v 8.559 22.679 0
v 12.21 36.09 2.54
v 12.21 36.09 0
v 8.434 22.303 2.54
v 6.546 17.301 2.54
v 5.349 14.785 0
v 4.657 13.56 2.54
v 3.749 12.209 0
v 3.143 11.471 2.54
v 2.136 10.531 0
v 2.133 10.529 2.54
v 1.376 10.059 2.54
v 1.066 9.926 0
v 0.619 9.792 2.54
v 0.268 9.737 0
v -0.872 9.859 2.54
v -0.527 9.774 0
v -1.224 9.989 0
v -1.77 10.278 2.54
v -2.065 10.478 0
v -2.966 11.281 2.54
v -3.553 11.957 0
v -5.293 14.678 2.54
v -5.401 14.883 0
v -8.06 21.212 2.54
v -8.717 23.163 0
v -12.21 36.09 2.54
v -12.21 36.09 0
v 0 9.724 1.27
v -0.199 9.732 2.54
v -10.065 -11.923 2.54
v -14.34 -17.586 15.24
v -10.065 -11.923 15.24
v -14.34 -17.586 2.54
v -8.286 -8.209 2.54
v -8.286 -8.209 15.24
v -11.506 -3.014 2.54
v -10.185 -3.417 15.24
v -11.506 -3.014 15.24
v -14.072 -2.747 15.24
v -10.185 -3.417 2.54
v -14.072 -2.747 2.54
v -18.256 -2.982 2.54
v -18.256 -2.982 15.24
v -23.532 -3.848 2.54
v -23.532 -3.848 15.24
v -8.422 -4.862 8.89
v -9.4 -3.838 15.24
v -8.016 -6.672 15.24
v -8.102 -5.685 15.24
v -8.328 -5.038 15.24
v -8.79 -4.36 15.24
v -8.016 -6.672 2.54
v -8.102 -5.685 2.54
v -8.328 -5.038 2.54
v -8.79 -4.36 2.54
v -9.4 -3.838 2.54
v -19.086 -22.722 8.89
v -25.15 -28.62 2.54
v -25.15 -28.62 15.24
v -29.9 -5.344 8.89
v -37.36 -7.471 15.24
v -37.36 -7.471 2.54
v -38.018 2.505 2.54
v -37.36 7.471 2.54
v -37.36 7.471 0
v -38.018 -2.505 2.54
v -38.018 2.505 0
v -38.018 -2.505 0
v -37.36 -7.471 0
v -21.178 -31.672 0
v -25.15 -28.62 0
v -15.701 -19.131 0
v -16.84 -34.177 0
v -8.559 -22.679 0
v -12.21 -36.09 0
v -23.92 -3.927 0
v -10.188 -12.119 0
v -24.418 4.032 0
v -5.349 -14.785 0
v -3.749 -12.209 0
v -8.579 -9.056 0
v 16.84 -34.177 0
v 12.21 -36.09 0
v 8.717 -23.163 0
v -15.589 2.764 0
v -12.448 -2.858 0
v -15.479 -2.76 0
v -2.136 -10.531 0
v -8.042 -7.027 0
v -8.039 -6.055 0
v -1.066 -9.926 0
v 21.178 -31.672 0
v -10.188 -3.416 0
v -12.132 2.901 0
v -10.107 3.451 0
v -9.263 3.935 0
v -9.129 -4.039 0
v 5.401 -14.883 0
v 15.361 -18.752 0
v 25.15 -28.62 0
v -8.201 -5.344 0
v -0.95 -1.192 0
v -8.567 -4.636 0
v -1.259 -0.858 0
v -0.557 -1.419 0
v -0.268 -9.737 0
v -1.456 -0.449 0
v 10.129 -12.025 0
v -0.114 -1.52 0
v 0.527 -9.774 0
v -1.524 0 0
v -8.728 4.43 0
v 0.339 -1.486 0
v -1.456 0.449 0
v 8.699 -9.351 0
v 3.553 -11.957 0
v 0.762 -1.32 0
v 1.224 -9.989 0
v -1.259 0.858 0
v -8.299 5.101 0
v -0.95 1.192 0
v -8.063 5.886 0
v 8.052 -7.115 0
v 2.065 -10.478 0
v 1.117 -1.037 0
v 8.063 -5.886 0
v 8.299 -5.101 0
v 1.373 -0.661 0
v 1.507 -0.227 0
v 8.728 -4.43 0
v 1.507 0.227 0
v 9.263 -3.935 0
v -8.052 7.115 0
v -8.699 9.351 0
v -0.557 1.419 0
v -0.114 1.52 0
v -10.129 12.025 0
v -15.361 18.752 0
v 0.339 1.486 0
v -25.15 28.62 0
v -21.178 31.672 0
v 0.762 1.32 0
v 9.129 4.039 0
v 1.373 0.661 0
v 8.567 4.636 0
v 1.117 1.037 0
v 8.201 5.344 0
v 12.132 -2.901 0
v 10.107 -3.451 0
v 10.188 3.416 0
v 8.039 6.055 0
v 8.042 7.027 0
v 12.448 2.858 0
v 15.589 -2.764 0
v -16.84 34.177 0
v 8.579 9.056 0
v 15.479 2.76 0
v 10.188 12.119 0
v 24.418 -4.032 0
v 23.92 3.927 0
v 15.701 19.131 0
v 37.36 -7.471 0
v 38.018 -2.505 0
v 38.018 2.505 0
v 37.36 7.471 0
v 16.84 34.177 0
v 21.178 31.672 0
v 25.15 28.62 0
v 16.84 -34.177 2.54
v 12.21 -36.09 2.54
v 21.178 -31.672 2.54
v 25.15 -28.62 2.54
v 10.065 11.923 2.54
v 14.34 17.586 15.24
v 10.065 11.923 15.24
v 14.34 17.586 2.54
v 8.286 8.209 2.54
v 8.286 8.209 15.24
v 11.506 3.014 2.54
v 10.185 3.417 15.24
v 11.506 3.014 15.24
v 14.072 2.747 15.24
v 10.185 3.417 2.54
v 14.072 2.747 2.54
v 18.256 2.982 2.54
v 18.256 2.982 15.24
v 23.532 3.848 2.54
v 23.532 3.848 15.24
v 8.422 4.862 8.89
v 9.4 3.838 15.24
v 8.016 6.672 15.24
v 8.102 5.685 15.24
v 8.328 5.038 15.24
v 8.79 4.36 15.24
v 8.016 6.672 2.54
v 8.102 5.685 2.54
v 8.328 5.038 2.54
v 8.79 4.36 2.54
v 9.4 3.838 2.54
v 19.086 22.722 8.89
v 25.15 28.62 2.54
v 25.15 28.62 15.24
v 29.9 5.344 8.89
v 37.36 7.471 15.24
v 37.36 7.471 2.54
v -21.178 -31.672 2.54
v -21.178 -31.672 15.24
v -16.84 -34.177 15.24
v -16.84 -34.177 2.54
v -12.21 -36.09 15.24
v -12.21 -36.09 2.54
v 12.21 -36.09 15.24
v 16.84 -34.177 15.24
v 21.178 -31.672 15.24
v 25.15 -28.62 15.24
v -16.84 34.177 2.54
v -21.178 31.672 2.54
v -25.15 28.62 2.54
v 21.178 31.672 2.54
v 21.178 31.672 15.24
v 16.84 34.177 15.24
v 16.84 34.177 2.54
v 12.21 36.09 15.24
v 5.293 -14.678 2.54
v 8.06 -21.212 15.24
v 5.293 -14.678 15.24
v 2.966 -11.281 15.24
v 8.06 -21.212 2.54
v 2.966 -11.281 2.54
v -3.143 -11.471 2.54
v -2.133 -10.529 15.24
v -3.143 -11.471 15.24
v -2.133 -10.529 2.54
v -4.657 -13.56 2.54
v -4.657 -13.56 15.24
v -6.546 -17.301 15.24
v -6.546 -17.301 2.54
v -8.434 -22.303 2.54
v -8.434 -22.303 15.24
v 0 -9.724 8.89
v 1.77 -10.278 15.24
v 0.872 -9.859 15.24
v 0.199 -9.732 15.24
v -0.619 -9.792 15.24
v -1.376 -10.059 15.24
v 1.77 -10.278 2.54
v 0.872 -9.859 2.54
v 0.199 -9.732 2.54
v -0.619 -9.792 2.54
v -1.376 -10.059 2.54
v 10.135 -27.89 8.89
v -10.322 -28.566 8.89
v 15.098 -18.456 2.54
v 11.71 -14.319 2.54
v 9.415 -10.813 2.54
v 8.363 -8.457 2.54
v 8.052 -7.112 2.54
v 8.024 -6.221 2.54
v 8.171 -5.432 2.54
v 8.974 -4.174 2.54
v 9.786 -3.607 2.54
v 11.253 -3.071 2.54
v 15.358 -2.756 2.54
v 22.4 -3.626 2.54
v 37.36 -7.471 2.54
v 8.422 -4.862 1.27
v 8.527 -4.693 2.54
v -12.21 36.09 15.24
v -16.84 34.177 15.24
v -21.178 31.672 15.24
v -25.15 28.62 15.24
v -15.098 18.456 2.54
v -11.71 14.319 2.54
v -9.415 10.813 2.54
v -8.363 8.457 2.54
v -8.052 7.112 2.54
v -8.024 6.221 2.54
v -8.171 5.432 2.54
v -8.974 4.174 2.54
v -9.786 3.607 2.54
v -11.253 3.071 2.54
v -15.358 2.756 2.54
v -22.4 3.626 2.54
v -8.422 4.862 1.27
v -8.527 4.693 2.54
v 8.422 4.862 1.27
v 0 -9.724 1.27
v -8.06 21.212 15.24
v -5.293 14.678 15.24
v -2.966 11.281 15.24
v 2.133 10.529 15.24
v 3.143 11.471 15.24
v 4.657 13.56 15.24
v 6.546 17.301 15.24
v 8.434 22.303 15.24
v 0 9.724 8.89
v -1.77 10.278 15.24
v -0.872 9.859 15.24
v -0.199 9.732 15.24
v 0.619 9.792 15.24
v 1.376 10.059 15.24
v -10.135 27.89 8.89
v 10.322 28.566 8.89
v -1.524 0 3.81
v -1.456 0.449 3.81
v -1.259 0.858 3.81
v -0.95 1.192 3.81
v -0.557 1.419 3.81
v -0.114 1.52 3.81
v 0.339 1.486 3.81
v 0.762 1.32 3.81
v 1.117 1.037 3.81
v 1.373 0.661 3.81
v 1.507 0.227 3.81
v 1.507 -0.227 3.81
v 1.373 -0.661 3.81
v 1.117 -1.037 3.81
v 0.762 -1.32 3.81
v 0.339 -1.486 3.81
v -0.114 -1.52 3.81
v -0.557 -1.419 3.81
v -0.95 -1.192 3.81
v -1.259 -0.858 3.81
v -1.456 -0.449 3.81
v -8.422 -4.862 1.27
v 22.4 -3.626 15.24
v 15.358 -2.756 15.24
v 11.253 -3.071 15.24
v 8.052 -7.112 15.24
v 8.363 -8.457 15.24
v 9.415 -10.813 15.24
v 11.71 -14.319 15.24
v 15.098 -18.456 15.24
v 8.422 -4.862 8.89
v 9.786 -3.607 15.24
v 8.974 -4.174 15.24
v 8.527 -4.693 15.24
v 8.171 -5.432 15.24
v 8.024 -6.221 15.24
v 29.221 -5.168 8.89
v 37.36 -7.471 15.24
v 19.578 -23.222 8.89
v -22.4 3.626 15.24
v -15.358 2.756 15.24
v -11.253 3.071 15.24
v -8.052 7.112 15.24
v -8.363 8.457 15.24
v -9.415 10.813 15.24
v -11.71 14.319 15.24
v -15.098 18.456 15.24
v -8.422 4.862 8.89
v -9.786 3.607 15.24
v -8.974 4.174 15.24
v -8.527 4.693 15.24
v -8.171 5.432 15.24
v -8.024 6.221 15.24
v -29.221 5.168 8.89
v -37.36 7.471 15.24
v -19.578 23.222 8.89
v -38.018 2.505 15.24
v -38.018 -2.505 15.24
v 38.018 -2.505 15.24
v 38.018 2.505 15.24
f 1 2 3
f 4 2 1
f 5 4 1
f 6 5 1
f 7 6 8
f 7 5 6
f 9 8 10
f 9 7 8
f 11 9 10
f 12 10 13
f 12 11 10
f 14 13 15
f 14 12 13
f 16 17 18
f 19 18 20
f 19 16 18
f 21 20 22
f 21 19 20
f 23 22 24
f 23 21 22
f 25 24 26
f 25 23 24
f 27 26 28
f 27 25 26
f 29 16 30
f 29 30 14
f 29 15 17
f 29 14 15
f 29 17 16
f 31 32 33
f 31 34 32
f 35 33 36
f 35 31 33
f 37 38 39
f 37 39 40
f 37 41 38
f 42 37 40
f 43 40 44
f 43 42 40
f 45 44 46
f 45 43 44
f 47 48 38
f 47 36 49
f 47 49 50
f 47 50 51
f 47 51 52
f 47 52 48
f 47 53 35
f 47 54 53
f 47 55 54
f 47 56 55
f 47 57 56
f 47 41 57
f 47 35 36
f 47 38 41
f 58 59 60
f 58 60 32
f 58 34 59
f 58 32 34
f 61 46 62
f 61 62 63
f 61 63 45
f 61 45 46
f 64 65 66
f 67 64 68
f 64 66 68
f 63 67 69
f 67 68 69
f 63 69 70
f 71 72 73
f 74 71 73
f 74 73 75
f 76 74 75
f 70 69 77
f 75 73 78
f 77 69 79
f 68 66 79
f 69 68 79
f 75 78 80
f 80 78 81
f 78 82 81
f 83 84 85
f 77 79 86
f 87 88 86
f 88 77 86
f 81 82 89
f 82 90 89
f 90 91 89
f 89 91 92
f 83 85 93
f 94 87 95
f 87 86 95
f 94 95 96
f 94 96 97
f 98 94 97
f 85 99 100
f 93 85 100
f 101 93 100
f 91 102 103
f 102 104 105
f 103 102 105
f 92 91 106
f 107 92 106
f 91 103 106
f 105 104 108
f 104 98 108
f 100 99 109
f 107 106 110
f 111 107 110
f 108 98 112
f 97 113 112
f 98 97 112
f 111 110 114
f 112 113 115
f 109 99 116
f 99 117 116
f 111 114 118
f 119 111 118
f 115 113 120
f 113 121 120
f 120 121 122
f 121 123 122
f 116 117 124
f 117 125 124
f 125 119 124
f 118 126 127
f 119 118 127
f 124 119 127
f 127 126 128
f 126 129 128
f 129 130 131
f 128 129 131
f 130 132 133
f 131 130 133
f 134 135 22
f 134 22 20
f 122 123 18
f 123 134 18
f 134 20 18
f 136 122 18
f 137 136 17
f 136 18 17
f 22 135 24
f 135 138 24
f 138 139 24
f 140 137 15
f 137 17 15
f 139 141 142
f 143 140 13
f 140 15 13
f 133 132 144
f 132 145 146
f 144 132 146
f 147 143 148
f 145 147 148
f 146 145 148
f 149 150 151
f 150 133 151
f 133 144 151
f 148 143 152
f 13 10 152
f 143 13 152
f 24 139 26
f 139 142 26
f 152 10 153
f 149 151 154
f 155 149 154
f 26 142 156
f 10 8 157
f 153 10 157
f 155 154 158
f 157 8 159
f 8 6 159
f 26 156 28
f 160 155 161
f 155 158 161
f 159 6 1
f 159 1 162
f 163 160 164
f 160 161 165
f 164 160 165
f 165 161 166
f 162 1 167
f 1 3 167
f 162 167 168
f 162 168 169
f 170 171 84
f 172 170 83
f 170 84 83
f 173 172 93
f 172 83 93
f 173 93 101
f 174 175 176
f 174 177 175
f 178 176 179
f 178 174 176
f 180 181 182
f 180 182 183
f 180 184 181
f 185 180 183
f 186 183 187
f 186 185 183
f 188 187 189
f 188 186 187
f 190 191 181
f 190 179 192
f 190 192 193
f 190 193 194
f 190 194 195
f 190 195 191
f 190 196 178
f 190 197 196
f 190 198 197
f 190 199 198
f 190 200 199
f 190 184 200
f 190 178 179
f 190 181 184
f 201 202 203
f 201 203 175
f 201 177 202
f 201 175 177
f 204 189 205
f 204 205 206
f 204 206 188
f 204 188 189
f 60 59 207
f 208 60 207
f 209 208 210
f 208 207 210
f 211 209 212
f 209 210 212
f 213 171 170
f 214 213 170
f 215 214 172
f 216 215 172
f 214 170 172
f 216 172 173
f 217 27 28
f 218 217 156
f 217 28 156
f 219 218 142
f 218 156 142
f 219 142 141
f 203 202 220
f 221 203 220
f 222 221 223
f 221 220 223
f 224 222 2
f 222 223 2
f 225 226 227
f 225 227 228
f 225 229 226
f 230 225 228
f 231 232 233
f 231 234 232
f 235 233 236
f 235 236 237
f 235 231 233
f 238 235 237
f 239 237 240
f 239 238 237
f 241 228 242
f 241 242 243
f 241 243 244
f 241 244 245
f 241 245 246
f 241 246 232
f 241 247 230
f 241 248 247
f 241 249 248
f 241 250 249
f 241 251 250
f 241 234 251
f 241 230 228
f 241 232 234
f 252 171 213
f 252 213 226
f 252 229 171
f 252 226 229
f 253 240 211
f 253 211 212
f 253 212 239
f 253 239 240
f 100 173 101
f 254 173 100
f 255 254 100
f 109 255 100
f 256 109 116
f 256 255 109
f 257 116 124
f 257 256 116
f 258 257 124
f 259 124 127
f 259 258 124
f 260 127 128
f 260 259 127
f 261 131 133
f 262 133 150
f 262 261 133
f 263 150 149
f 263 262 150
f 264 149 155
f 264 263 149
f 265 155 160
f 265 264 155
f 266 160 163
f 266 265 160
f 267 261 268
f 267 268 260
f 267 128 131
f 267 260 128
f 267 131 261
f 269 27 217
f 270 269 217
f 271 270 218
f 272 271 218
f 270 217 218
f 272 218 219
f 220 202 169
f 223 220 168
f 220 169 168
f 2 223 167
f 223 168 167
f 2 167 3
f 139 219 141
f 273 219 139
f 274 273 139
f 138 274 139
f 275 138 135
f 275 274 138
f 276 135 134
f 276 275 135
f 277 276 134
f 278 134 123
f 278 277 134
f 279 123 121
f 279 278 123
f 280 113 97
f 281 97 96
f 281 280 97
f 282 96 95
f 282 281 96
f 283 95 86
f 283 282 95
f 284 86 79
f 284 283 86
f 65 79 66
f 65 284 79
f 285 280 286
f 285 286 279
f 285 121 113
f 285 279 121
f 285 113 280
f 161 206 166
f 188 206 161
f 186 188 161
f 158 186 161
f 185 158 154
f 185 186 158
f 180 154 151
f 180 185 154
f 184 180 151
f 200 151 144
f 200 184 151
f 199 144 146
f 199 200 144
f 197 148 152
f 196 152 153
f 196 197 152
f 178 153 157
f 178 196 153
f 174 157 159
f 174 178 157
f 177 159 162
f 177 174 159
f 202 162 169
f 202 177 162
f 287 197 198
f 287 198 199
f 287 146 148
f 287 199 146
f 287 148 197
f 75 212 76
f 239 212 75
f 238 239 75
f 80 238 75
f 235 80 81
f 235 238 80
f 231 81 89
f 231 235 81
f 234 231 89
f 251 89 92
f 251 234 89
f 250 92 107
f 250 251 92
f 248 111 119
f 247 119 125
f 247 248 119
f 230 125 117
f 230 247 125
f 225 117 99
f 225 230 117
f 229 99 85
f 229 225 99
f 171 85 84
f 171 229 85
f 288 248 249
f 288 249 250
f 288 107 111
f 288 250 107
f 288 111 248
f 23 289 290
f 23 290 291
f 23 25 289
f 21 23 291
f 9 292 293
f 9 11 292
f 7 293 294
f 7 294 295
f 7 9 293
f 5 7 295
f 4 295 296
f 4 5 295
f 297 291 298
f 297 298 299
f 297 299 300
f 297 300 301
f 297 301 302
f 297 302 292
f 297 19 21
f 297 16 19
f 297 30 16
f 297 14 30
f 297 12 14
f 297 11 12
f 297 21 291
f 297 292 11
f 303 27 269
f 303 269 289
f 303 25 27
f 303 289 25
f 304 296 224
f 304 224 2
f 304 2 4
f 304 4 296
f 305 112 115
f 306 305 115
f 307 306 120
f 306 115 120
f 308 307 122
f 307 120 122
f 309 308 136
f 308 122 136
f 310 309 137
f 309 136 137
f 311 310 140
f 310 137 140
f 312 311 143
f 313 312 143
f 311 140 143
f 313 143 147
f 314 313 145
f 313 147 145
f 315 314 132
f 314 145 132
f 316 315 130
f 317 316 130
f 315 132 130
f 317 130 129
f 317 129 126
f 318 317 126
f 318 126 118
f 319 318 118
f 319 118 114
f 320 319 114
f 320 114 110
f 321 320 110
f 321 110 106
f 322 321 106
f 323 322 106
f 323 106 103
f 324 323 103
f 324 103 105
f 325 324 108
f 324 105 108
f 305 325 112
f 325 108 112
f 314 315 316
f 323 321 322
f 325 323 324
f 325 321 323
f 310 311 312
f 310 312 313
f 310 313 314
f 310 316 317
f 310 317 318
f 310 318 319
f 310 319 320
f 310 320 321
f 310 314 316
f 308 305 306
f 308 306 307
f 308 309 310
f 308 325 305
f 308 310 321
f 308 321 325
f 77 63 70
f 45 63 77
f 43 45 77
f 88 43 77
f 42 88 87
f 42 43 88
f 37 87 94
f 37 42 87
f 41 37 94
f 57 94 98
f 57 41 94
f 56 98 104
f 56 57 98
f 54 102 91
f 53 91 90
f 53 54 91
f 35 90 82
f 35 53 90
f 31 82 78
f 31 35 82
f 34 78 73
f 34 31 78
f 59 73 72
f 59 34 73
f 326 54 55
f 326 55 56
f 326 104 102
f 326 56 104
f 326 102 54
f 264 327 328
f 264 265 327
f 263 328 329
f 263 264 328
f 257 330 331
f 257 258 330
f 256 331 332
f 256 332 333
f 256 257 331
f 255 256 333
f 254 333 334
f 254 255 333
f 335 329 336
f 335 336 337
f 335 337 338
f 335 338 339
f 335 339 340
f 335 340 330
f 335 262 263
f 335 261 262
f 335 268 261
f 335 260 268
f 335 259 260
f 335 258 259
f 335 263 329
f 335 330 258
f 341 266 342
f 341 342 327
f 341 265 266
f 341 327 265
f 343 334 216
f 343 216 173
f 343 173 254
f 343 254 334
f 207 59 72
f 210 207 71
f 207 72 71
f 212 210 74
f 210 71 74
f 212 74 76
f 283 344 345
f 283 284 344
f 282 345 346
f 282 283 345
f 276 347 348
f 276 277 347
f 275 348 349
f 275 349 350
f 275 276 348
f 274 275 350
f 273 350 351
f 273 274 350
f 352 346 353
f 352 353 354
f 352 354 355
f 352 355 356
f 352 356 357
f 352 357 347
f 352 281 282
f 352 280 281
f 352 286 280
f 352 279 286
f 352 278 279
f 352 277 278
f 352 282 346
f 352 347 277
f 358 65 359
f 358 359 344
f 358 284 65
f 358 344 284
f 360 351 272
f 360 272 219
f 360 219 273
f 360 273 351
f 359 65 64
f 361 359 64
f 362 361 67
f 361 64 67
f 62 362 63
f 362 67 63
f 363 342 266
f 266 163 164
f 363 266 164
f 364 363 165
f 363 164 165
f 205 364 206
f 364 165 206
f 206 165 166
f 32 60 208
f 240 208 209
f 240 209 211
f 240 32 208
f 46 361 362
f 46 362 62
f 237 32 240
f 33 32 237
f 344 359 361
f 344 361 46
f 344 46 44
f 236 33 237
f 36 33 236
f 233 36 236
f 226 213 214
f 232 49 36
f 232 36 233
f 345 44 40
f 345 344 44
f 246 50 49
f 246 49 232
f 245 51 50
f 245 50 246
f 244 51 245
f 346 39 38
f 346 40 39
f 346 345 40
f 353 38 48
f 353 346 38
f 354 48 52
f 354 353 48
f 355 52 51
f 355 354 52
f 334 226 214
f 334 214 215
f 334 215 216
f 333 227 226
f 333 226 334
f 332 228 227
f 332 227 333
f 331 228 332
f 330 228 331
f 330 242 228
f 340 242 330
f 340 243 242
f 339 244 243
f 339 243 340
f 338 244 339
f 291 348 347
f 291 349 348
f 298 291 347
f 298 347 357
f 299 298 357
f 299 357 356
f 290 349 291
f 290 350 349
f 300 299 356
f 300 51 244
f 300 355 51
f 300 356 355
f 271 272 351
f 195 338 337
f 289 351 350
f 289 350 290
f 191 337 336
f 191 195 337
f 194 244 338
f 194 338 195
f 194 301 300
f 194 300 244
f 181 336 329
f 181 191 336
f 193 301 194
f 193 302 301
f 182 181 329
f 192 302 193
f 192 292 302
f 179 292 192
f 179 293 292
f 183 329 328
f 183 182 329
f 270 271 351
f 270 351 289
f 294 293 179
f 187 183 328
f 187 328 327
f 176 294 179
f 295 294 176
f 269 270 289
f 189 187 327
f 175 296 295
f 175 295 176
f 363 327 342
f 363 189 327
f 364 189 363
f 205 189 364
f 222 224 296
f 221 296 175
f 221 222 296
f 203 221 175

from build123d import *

# Parameters (mm, degrees)
SKETCH2_R           = 38.1
BOSS_EXTRUDE1_DEPTH = 2.54
BOSS_EXTRUDE2_DEPTH = 12.7
SKETCH4_R           = 1.524
CUT_EXTRUDE1_DEPTH  = 3.81
CUT_EXTRUDE2_DEPTH  = 46.228


with BuildPart() as part:
    # Sketch2 → Boss-Extrude1 (new body)
    with BuildSketch(Plane.XY):
        Circle(SKETCH2_R)
    extrude(amount=BOSS_EXTRUDE1_DEPTH)

    # Sketch3 → Boss-Extrude2 (add)
    with BuildSketch(Plane.XY.offset(2.54)):
        with BuildLine():
            ThreePointArc((-37.360397619, 7.470655243), (-38.1, 0), (-37.360397619, -7.470655243))
            add(Edge.make_bspline(
                [(-25.149976033, -28.619725812), (14.41186903, 8.320696464), (-37.360397619, -7.470655243)],
                knots=[0, 0, 0, 1, 1, 1], degree=2))
            ThreePointArc((-25.149976033, -28.619725812), (-19.05, -32.995567884), (-12.210421586, -36.090381055))
            add(Edge.make_bspline(
                [(12.210421586, -36.090381055), (0, 16.641392928), (-12.210421586, -36.090381055)],
                knots=[0, 0, 0, 1, 1, 1], degree=2))
            ThreePointArc((12.210421586, -36.090381055), (19.05, -32.995567884), (25.149976033, -28.619725812))
            add(Edge.make_bspline(
                [(37.360397619, -7.470655243), (-14.41186903, 8.320696464), (25.149976033, -28.619725812)],
                knots=[0, 0, 0, 1, 1, 1], degree=2))
            ThreePointArc((37.360397619, -7.470655243), (38.1, 0), (37.360397619, 7.470655243))
            add(Edge.make_bspline(
                [(25.149976033, 28.619725812), (-14.41186903, -8.320696464), (37.360397619, 7.470655243)],
                knots=[0, 0, 0, 1, 1, 1], degree=2))
            ThreePointArc((25.149976033, 28.619725812), (19.05, 32.995567884), (12.210421586, 36.090381055))
            add(Edge.make_bspline(
                [(-12.210421586, 36.090381055), (0, -16.641392928), (12.210421586, 36.090381055)],
                knots=[0, 0, 0, 1, 1, 1], degree=2))
            ThreePointArc((-12.210421586, 36.090381055), (-19.05, 32.995567884), (-25.149976033, 28.619725812))
            add(Edge.make_bspline(
                [(-37.360397619, 7.470655243), (14.41186903, -8.320696464), (-25.149976033, 28.619725812)],
                knots=[0, 0, 0, 1, 1, 1], degree=2))
        make_face()
    extrude(amount=BOSS_EXTRUDE2_DEPTH)

    # Sketch4 → Cut-Extrude1 (cut)
    with BuildSketch(Plane(origin=(0, 0, 0), x_dir=(-1, 0, 0), z_dir=(0, 0, -1))):
        Circle(SKETCH4_R)
    extrude(amount=-CUT_EXTRUDE1_DEPTH, mode=Mode.SUBTRACT)

    # Sketch6 → Cut-Extrude2 (cut)
    with BuildSketch(Plane.XY.offset(15.24)):
        with BuildLine():
            ThreePointArc((25.149976033, -28.619725812), (32.995567884, -19.05), (37.360397619, -7.470655243))
            add(Edge.make_bspline(
                [(25.149976033, -28.619725812), (-14.41186903, 8.320696464), (37.360397619, -7.470655243)],
                knots=[0, 0, 0, 1, 1, 1], degree=2))
        make_face()
        with BuildLine():
            ThreePointArc((37.360397619, 7.470655243), (32.995567884, 19.05), (25.149976033, 28.619725812))
            add(Edge.make_bspline(
                [(37.360397619, 7.470655243), (-14.41186903, -8.320696464), (25.149976033, 28.619725812)],
                knots=[0, 0, 0, 1, 1, 1], degree=2))
        make_face()
        with BuildLine():
            ThreePointArc((12.210421586, 36.090381055), (0, 38.1), (-12.210421586, 36.090381055))
            add(Edge.make_bspline(
                [(12.210421586, 36.090381055), (0, -16.641392928), (-12.210421586, 36.090381055)],
                knots=[0, 0, 0, 1, 1, 1], degree=2))
        make_face()
        with BuildLine():
            ThreePointArc((-25.149976033, 28.619725812), (-32.995567884, 19.05), (-37.360397619, 7.470655243))
            add(Edge.make_bspline(
                [(-25.149976033, 28.619725812), (14.41186903, -8.320696464), (-37.360397619, 7.470655243)],
                knots=[0, 0, 0, 1, 1, 1], degree=2))
        make_face()
        with BuildLine():
            ThreePointArc((-37.360397619, -7.470655243), (-32.995567884, -19.05), (-25.149976033, -28.619725812))
            add(Edge.make_bspline(
                [(-37.360397619, -7.470655243), (14.41186903, 8.320696464), (-25.149976033, -28.619725812)],
                knots=[0, 0, 0, 1, 1, 1], degree=2))
        make_face()
        with BuildLine():
            ThreePointArc((-12.210421586, -36.090381055), (0, -38.1), (12.210421586, -36.090381055))
            add(Edge.make_bspline(
                [(-12.210421586, -36.090381055), (0, 16.641392928), (12.210421586, -36.090381055)],
                knots=[0, 0, 0, 1, 1, 1], degree=2))
        make_face()
    extrude(amount=-CUT_EXTRUDE2_DEPTH, mode=Mode.SUBTRACT)


solid = part.part
